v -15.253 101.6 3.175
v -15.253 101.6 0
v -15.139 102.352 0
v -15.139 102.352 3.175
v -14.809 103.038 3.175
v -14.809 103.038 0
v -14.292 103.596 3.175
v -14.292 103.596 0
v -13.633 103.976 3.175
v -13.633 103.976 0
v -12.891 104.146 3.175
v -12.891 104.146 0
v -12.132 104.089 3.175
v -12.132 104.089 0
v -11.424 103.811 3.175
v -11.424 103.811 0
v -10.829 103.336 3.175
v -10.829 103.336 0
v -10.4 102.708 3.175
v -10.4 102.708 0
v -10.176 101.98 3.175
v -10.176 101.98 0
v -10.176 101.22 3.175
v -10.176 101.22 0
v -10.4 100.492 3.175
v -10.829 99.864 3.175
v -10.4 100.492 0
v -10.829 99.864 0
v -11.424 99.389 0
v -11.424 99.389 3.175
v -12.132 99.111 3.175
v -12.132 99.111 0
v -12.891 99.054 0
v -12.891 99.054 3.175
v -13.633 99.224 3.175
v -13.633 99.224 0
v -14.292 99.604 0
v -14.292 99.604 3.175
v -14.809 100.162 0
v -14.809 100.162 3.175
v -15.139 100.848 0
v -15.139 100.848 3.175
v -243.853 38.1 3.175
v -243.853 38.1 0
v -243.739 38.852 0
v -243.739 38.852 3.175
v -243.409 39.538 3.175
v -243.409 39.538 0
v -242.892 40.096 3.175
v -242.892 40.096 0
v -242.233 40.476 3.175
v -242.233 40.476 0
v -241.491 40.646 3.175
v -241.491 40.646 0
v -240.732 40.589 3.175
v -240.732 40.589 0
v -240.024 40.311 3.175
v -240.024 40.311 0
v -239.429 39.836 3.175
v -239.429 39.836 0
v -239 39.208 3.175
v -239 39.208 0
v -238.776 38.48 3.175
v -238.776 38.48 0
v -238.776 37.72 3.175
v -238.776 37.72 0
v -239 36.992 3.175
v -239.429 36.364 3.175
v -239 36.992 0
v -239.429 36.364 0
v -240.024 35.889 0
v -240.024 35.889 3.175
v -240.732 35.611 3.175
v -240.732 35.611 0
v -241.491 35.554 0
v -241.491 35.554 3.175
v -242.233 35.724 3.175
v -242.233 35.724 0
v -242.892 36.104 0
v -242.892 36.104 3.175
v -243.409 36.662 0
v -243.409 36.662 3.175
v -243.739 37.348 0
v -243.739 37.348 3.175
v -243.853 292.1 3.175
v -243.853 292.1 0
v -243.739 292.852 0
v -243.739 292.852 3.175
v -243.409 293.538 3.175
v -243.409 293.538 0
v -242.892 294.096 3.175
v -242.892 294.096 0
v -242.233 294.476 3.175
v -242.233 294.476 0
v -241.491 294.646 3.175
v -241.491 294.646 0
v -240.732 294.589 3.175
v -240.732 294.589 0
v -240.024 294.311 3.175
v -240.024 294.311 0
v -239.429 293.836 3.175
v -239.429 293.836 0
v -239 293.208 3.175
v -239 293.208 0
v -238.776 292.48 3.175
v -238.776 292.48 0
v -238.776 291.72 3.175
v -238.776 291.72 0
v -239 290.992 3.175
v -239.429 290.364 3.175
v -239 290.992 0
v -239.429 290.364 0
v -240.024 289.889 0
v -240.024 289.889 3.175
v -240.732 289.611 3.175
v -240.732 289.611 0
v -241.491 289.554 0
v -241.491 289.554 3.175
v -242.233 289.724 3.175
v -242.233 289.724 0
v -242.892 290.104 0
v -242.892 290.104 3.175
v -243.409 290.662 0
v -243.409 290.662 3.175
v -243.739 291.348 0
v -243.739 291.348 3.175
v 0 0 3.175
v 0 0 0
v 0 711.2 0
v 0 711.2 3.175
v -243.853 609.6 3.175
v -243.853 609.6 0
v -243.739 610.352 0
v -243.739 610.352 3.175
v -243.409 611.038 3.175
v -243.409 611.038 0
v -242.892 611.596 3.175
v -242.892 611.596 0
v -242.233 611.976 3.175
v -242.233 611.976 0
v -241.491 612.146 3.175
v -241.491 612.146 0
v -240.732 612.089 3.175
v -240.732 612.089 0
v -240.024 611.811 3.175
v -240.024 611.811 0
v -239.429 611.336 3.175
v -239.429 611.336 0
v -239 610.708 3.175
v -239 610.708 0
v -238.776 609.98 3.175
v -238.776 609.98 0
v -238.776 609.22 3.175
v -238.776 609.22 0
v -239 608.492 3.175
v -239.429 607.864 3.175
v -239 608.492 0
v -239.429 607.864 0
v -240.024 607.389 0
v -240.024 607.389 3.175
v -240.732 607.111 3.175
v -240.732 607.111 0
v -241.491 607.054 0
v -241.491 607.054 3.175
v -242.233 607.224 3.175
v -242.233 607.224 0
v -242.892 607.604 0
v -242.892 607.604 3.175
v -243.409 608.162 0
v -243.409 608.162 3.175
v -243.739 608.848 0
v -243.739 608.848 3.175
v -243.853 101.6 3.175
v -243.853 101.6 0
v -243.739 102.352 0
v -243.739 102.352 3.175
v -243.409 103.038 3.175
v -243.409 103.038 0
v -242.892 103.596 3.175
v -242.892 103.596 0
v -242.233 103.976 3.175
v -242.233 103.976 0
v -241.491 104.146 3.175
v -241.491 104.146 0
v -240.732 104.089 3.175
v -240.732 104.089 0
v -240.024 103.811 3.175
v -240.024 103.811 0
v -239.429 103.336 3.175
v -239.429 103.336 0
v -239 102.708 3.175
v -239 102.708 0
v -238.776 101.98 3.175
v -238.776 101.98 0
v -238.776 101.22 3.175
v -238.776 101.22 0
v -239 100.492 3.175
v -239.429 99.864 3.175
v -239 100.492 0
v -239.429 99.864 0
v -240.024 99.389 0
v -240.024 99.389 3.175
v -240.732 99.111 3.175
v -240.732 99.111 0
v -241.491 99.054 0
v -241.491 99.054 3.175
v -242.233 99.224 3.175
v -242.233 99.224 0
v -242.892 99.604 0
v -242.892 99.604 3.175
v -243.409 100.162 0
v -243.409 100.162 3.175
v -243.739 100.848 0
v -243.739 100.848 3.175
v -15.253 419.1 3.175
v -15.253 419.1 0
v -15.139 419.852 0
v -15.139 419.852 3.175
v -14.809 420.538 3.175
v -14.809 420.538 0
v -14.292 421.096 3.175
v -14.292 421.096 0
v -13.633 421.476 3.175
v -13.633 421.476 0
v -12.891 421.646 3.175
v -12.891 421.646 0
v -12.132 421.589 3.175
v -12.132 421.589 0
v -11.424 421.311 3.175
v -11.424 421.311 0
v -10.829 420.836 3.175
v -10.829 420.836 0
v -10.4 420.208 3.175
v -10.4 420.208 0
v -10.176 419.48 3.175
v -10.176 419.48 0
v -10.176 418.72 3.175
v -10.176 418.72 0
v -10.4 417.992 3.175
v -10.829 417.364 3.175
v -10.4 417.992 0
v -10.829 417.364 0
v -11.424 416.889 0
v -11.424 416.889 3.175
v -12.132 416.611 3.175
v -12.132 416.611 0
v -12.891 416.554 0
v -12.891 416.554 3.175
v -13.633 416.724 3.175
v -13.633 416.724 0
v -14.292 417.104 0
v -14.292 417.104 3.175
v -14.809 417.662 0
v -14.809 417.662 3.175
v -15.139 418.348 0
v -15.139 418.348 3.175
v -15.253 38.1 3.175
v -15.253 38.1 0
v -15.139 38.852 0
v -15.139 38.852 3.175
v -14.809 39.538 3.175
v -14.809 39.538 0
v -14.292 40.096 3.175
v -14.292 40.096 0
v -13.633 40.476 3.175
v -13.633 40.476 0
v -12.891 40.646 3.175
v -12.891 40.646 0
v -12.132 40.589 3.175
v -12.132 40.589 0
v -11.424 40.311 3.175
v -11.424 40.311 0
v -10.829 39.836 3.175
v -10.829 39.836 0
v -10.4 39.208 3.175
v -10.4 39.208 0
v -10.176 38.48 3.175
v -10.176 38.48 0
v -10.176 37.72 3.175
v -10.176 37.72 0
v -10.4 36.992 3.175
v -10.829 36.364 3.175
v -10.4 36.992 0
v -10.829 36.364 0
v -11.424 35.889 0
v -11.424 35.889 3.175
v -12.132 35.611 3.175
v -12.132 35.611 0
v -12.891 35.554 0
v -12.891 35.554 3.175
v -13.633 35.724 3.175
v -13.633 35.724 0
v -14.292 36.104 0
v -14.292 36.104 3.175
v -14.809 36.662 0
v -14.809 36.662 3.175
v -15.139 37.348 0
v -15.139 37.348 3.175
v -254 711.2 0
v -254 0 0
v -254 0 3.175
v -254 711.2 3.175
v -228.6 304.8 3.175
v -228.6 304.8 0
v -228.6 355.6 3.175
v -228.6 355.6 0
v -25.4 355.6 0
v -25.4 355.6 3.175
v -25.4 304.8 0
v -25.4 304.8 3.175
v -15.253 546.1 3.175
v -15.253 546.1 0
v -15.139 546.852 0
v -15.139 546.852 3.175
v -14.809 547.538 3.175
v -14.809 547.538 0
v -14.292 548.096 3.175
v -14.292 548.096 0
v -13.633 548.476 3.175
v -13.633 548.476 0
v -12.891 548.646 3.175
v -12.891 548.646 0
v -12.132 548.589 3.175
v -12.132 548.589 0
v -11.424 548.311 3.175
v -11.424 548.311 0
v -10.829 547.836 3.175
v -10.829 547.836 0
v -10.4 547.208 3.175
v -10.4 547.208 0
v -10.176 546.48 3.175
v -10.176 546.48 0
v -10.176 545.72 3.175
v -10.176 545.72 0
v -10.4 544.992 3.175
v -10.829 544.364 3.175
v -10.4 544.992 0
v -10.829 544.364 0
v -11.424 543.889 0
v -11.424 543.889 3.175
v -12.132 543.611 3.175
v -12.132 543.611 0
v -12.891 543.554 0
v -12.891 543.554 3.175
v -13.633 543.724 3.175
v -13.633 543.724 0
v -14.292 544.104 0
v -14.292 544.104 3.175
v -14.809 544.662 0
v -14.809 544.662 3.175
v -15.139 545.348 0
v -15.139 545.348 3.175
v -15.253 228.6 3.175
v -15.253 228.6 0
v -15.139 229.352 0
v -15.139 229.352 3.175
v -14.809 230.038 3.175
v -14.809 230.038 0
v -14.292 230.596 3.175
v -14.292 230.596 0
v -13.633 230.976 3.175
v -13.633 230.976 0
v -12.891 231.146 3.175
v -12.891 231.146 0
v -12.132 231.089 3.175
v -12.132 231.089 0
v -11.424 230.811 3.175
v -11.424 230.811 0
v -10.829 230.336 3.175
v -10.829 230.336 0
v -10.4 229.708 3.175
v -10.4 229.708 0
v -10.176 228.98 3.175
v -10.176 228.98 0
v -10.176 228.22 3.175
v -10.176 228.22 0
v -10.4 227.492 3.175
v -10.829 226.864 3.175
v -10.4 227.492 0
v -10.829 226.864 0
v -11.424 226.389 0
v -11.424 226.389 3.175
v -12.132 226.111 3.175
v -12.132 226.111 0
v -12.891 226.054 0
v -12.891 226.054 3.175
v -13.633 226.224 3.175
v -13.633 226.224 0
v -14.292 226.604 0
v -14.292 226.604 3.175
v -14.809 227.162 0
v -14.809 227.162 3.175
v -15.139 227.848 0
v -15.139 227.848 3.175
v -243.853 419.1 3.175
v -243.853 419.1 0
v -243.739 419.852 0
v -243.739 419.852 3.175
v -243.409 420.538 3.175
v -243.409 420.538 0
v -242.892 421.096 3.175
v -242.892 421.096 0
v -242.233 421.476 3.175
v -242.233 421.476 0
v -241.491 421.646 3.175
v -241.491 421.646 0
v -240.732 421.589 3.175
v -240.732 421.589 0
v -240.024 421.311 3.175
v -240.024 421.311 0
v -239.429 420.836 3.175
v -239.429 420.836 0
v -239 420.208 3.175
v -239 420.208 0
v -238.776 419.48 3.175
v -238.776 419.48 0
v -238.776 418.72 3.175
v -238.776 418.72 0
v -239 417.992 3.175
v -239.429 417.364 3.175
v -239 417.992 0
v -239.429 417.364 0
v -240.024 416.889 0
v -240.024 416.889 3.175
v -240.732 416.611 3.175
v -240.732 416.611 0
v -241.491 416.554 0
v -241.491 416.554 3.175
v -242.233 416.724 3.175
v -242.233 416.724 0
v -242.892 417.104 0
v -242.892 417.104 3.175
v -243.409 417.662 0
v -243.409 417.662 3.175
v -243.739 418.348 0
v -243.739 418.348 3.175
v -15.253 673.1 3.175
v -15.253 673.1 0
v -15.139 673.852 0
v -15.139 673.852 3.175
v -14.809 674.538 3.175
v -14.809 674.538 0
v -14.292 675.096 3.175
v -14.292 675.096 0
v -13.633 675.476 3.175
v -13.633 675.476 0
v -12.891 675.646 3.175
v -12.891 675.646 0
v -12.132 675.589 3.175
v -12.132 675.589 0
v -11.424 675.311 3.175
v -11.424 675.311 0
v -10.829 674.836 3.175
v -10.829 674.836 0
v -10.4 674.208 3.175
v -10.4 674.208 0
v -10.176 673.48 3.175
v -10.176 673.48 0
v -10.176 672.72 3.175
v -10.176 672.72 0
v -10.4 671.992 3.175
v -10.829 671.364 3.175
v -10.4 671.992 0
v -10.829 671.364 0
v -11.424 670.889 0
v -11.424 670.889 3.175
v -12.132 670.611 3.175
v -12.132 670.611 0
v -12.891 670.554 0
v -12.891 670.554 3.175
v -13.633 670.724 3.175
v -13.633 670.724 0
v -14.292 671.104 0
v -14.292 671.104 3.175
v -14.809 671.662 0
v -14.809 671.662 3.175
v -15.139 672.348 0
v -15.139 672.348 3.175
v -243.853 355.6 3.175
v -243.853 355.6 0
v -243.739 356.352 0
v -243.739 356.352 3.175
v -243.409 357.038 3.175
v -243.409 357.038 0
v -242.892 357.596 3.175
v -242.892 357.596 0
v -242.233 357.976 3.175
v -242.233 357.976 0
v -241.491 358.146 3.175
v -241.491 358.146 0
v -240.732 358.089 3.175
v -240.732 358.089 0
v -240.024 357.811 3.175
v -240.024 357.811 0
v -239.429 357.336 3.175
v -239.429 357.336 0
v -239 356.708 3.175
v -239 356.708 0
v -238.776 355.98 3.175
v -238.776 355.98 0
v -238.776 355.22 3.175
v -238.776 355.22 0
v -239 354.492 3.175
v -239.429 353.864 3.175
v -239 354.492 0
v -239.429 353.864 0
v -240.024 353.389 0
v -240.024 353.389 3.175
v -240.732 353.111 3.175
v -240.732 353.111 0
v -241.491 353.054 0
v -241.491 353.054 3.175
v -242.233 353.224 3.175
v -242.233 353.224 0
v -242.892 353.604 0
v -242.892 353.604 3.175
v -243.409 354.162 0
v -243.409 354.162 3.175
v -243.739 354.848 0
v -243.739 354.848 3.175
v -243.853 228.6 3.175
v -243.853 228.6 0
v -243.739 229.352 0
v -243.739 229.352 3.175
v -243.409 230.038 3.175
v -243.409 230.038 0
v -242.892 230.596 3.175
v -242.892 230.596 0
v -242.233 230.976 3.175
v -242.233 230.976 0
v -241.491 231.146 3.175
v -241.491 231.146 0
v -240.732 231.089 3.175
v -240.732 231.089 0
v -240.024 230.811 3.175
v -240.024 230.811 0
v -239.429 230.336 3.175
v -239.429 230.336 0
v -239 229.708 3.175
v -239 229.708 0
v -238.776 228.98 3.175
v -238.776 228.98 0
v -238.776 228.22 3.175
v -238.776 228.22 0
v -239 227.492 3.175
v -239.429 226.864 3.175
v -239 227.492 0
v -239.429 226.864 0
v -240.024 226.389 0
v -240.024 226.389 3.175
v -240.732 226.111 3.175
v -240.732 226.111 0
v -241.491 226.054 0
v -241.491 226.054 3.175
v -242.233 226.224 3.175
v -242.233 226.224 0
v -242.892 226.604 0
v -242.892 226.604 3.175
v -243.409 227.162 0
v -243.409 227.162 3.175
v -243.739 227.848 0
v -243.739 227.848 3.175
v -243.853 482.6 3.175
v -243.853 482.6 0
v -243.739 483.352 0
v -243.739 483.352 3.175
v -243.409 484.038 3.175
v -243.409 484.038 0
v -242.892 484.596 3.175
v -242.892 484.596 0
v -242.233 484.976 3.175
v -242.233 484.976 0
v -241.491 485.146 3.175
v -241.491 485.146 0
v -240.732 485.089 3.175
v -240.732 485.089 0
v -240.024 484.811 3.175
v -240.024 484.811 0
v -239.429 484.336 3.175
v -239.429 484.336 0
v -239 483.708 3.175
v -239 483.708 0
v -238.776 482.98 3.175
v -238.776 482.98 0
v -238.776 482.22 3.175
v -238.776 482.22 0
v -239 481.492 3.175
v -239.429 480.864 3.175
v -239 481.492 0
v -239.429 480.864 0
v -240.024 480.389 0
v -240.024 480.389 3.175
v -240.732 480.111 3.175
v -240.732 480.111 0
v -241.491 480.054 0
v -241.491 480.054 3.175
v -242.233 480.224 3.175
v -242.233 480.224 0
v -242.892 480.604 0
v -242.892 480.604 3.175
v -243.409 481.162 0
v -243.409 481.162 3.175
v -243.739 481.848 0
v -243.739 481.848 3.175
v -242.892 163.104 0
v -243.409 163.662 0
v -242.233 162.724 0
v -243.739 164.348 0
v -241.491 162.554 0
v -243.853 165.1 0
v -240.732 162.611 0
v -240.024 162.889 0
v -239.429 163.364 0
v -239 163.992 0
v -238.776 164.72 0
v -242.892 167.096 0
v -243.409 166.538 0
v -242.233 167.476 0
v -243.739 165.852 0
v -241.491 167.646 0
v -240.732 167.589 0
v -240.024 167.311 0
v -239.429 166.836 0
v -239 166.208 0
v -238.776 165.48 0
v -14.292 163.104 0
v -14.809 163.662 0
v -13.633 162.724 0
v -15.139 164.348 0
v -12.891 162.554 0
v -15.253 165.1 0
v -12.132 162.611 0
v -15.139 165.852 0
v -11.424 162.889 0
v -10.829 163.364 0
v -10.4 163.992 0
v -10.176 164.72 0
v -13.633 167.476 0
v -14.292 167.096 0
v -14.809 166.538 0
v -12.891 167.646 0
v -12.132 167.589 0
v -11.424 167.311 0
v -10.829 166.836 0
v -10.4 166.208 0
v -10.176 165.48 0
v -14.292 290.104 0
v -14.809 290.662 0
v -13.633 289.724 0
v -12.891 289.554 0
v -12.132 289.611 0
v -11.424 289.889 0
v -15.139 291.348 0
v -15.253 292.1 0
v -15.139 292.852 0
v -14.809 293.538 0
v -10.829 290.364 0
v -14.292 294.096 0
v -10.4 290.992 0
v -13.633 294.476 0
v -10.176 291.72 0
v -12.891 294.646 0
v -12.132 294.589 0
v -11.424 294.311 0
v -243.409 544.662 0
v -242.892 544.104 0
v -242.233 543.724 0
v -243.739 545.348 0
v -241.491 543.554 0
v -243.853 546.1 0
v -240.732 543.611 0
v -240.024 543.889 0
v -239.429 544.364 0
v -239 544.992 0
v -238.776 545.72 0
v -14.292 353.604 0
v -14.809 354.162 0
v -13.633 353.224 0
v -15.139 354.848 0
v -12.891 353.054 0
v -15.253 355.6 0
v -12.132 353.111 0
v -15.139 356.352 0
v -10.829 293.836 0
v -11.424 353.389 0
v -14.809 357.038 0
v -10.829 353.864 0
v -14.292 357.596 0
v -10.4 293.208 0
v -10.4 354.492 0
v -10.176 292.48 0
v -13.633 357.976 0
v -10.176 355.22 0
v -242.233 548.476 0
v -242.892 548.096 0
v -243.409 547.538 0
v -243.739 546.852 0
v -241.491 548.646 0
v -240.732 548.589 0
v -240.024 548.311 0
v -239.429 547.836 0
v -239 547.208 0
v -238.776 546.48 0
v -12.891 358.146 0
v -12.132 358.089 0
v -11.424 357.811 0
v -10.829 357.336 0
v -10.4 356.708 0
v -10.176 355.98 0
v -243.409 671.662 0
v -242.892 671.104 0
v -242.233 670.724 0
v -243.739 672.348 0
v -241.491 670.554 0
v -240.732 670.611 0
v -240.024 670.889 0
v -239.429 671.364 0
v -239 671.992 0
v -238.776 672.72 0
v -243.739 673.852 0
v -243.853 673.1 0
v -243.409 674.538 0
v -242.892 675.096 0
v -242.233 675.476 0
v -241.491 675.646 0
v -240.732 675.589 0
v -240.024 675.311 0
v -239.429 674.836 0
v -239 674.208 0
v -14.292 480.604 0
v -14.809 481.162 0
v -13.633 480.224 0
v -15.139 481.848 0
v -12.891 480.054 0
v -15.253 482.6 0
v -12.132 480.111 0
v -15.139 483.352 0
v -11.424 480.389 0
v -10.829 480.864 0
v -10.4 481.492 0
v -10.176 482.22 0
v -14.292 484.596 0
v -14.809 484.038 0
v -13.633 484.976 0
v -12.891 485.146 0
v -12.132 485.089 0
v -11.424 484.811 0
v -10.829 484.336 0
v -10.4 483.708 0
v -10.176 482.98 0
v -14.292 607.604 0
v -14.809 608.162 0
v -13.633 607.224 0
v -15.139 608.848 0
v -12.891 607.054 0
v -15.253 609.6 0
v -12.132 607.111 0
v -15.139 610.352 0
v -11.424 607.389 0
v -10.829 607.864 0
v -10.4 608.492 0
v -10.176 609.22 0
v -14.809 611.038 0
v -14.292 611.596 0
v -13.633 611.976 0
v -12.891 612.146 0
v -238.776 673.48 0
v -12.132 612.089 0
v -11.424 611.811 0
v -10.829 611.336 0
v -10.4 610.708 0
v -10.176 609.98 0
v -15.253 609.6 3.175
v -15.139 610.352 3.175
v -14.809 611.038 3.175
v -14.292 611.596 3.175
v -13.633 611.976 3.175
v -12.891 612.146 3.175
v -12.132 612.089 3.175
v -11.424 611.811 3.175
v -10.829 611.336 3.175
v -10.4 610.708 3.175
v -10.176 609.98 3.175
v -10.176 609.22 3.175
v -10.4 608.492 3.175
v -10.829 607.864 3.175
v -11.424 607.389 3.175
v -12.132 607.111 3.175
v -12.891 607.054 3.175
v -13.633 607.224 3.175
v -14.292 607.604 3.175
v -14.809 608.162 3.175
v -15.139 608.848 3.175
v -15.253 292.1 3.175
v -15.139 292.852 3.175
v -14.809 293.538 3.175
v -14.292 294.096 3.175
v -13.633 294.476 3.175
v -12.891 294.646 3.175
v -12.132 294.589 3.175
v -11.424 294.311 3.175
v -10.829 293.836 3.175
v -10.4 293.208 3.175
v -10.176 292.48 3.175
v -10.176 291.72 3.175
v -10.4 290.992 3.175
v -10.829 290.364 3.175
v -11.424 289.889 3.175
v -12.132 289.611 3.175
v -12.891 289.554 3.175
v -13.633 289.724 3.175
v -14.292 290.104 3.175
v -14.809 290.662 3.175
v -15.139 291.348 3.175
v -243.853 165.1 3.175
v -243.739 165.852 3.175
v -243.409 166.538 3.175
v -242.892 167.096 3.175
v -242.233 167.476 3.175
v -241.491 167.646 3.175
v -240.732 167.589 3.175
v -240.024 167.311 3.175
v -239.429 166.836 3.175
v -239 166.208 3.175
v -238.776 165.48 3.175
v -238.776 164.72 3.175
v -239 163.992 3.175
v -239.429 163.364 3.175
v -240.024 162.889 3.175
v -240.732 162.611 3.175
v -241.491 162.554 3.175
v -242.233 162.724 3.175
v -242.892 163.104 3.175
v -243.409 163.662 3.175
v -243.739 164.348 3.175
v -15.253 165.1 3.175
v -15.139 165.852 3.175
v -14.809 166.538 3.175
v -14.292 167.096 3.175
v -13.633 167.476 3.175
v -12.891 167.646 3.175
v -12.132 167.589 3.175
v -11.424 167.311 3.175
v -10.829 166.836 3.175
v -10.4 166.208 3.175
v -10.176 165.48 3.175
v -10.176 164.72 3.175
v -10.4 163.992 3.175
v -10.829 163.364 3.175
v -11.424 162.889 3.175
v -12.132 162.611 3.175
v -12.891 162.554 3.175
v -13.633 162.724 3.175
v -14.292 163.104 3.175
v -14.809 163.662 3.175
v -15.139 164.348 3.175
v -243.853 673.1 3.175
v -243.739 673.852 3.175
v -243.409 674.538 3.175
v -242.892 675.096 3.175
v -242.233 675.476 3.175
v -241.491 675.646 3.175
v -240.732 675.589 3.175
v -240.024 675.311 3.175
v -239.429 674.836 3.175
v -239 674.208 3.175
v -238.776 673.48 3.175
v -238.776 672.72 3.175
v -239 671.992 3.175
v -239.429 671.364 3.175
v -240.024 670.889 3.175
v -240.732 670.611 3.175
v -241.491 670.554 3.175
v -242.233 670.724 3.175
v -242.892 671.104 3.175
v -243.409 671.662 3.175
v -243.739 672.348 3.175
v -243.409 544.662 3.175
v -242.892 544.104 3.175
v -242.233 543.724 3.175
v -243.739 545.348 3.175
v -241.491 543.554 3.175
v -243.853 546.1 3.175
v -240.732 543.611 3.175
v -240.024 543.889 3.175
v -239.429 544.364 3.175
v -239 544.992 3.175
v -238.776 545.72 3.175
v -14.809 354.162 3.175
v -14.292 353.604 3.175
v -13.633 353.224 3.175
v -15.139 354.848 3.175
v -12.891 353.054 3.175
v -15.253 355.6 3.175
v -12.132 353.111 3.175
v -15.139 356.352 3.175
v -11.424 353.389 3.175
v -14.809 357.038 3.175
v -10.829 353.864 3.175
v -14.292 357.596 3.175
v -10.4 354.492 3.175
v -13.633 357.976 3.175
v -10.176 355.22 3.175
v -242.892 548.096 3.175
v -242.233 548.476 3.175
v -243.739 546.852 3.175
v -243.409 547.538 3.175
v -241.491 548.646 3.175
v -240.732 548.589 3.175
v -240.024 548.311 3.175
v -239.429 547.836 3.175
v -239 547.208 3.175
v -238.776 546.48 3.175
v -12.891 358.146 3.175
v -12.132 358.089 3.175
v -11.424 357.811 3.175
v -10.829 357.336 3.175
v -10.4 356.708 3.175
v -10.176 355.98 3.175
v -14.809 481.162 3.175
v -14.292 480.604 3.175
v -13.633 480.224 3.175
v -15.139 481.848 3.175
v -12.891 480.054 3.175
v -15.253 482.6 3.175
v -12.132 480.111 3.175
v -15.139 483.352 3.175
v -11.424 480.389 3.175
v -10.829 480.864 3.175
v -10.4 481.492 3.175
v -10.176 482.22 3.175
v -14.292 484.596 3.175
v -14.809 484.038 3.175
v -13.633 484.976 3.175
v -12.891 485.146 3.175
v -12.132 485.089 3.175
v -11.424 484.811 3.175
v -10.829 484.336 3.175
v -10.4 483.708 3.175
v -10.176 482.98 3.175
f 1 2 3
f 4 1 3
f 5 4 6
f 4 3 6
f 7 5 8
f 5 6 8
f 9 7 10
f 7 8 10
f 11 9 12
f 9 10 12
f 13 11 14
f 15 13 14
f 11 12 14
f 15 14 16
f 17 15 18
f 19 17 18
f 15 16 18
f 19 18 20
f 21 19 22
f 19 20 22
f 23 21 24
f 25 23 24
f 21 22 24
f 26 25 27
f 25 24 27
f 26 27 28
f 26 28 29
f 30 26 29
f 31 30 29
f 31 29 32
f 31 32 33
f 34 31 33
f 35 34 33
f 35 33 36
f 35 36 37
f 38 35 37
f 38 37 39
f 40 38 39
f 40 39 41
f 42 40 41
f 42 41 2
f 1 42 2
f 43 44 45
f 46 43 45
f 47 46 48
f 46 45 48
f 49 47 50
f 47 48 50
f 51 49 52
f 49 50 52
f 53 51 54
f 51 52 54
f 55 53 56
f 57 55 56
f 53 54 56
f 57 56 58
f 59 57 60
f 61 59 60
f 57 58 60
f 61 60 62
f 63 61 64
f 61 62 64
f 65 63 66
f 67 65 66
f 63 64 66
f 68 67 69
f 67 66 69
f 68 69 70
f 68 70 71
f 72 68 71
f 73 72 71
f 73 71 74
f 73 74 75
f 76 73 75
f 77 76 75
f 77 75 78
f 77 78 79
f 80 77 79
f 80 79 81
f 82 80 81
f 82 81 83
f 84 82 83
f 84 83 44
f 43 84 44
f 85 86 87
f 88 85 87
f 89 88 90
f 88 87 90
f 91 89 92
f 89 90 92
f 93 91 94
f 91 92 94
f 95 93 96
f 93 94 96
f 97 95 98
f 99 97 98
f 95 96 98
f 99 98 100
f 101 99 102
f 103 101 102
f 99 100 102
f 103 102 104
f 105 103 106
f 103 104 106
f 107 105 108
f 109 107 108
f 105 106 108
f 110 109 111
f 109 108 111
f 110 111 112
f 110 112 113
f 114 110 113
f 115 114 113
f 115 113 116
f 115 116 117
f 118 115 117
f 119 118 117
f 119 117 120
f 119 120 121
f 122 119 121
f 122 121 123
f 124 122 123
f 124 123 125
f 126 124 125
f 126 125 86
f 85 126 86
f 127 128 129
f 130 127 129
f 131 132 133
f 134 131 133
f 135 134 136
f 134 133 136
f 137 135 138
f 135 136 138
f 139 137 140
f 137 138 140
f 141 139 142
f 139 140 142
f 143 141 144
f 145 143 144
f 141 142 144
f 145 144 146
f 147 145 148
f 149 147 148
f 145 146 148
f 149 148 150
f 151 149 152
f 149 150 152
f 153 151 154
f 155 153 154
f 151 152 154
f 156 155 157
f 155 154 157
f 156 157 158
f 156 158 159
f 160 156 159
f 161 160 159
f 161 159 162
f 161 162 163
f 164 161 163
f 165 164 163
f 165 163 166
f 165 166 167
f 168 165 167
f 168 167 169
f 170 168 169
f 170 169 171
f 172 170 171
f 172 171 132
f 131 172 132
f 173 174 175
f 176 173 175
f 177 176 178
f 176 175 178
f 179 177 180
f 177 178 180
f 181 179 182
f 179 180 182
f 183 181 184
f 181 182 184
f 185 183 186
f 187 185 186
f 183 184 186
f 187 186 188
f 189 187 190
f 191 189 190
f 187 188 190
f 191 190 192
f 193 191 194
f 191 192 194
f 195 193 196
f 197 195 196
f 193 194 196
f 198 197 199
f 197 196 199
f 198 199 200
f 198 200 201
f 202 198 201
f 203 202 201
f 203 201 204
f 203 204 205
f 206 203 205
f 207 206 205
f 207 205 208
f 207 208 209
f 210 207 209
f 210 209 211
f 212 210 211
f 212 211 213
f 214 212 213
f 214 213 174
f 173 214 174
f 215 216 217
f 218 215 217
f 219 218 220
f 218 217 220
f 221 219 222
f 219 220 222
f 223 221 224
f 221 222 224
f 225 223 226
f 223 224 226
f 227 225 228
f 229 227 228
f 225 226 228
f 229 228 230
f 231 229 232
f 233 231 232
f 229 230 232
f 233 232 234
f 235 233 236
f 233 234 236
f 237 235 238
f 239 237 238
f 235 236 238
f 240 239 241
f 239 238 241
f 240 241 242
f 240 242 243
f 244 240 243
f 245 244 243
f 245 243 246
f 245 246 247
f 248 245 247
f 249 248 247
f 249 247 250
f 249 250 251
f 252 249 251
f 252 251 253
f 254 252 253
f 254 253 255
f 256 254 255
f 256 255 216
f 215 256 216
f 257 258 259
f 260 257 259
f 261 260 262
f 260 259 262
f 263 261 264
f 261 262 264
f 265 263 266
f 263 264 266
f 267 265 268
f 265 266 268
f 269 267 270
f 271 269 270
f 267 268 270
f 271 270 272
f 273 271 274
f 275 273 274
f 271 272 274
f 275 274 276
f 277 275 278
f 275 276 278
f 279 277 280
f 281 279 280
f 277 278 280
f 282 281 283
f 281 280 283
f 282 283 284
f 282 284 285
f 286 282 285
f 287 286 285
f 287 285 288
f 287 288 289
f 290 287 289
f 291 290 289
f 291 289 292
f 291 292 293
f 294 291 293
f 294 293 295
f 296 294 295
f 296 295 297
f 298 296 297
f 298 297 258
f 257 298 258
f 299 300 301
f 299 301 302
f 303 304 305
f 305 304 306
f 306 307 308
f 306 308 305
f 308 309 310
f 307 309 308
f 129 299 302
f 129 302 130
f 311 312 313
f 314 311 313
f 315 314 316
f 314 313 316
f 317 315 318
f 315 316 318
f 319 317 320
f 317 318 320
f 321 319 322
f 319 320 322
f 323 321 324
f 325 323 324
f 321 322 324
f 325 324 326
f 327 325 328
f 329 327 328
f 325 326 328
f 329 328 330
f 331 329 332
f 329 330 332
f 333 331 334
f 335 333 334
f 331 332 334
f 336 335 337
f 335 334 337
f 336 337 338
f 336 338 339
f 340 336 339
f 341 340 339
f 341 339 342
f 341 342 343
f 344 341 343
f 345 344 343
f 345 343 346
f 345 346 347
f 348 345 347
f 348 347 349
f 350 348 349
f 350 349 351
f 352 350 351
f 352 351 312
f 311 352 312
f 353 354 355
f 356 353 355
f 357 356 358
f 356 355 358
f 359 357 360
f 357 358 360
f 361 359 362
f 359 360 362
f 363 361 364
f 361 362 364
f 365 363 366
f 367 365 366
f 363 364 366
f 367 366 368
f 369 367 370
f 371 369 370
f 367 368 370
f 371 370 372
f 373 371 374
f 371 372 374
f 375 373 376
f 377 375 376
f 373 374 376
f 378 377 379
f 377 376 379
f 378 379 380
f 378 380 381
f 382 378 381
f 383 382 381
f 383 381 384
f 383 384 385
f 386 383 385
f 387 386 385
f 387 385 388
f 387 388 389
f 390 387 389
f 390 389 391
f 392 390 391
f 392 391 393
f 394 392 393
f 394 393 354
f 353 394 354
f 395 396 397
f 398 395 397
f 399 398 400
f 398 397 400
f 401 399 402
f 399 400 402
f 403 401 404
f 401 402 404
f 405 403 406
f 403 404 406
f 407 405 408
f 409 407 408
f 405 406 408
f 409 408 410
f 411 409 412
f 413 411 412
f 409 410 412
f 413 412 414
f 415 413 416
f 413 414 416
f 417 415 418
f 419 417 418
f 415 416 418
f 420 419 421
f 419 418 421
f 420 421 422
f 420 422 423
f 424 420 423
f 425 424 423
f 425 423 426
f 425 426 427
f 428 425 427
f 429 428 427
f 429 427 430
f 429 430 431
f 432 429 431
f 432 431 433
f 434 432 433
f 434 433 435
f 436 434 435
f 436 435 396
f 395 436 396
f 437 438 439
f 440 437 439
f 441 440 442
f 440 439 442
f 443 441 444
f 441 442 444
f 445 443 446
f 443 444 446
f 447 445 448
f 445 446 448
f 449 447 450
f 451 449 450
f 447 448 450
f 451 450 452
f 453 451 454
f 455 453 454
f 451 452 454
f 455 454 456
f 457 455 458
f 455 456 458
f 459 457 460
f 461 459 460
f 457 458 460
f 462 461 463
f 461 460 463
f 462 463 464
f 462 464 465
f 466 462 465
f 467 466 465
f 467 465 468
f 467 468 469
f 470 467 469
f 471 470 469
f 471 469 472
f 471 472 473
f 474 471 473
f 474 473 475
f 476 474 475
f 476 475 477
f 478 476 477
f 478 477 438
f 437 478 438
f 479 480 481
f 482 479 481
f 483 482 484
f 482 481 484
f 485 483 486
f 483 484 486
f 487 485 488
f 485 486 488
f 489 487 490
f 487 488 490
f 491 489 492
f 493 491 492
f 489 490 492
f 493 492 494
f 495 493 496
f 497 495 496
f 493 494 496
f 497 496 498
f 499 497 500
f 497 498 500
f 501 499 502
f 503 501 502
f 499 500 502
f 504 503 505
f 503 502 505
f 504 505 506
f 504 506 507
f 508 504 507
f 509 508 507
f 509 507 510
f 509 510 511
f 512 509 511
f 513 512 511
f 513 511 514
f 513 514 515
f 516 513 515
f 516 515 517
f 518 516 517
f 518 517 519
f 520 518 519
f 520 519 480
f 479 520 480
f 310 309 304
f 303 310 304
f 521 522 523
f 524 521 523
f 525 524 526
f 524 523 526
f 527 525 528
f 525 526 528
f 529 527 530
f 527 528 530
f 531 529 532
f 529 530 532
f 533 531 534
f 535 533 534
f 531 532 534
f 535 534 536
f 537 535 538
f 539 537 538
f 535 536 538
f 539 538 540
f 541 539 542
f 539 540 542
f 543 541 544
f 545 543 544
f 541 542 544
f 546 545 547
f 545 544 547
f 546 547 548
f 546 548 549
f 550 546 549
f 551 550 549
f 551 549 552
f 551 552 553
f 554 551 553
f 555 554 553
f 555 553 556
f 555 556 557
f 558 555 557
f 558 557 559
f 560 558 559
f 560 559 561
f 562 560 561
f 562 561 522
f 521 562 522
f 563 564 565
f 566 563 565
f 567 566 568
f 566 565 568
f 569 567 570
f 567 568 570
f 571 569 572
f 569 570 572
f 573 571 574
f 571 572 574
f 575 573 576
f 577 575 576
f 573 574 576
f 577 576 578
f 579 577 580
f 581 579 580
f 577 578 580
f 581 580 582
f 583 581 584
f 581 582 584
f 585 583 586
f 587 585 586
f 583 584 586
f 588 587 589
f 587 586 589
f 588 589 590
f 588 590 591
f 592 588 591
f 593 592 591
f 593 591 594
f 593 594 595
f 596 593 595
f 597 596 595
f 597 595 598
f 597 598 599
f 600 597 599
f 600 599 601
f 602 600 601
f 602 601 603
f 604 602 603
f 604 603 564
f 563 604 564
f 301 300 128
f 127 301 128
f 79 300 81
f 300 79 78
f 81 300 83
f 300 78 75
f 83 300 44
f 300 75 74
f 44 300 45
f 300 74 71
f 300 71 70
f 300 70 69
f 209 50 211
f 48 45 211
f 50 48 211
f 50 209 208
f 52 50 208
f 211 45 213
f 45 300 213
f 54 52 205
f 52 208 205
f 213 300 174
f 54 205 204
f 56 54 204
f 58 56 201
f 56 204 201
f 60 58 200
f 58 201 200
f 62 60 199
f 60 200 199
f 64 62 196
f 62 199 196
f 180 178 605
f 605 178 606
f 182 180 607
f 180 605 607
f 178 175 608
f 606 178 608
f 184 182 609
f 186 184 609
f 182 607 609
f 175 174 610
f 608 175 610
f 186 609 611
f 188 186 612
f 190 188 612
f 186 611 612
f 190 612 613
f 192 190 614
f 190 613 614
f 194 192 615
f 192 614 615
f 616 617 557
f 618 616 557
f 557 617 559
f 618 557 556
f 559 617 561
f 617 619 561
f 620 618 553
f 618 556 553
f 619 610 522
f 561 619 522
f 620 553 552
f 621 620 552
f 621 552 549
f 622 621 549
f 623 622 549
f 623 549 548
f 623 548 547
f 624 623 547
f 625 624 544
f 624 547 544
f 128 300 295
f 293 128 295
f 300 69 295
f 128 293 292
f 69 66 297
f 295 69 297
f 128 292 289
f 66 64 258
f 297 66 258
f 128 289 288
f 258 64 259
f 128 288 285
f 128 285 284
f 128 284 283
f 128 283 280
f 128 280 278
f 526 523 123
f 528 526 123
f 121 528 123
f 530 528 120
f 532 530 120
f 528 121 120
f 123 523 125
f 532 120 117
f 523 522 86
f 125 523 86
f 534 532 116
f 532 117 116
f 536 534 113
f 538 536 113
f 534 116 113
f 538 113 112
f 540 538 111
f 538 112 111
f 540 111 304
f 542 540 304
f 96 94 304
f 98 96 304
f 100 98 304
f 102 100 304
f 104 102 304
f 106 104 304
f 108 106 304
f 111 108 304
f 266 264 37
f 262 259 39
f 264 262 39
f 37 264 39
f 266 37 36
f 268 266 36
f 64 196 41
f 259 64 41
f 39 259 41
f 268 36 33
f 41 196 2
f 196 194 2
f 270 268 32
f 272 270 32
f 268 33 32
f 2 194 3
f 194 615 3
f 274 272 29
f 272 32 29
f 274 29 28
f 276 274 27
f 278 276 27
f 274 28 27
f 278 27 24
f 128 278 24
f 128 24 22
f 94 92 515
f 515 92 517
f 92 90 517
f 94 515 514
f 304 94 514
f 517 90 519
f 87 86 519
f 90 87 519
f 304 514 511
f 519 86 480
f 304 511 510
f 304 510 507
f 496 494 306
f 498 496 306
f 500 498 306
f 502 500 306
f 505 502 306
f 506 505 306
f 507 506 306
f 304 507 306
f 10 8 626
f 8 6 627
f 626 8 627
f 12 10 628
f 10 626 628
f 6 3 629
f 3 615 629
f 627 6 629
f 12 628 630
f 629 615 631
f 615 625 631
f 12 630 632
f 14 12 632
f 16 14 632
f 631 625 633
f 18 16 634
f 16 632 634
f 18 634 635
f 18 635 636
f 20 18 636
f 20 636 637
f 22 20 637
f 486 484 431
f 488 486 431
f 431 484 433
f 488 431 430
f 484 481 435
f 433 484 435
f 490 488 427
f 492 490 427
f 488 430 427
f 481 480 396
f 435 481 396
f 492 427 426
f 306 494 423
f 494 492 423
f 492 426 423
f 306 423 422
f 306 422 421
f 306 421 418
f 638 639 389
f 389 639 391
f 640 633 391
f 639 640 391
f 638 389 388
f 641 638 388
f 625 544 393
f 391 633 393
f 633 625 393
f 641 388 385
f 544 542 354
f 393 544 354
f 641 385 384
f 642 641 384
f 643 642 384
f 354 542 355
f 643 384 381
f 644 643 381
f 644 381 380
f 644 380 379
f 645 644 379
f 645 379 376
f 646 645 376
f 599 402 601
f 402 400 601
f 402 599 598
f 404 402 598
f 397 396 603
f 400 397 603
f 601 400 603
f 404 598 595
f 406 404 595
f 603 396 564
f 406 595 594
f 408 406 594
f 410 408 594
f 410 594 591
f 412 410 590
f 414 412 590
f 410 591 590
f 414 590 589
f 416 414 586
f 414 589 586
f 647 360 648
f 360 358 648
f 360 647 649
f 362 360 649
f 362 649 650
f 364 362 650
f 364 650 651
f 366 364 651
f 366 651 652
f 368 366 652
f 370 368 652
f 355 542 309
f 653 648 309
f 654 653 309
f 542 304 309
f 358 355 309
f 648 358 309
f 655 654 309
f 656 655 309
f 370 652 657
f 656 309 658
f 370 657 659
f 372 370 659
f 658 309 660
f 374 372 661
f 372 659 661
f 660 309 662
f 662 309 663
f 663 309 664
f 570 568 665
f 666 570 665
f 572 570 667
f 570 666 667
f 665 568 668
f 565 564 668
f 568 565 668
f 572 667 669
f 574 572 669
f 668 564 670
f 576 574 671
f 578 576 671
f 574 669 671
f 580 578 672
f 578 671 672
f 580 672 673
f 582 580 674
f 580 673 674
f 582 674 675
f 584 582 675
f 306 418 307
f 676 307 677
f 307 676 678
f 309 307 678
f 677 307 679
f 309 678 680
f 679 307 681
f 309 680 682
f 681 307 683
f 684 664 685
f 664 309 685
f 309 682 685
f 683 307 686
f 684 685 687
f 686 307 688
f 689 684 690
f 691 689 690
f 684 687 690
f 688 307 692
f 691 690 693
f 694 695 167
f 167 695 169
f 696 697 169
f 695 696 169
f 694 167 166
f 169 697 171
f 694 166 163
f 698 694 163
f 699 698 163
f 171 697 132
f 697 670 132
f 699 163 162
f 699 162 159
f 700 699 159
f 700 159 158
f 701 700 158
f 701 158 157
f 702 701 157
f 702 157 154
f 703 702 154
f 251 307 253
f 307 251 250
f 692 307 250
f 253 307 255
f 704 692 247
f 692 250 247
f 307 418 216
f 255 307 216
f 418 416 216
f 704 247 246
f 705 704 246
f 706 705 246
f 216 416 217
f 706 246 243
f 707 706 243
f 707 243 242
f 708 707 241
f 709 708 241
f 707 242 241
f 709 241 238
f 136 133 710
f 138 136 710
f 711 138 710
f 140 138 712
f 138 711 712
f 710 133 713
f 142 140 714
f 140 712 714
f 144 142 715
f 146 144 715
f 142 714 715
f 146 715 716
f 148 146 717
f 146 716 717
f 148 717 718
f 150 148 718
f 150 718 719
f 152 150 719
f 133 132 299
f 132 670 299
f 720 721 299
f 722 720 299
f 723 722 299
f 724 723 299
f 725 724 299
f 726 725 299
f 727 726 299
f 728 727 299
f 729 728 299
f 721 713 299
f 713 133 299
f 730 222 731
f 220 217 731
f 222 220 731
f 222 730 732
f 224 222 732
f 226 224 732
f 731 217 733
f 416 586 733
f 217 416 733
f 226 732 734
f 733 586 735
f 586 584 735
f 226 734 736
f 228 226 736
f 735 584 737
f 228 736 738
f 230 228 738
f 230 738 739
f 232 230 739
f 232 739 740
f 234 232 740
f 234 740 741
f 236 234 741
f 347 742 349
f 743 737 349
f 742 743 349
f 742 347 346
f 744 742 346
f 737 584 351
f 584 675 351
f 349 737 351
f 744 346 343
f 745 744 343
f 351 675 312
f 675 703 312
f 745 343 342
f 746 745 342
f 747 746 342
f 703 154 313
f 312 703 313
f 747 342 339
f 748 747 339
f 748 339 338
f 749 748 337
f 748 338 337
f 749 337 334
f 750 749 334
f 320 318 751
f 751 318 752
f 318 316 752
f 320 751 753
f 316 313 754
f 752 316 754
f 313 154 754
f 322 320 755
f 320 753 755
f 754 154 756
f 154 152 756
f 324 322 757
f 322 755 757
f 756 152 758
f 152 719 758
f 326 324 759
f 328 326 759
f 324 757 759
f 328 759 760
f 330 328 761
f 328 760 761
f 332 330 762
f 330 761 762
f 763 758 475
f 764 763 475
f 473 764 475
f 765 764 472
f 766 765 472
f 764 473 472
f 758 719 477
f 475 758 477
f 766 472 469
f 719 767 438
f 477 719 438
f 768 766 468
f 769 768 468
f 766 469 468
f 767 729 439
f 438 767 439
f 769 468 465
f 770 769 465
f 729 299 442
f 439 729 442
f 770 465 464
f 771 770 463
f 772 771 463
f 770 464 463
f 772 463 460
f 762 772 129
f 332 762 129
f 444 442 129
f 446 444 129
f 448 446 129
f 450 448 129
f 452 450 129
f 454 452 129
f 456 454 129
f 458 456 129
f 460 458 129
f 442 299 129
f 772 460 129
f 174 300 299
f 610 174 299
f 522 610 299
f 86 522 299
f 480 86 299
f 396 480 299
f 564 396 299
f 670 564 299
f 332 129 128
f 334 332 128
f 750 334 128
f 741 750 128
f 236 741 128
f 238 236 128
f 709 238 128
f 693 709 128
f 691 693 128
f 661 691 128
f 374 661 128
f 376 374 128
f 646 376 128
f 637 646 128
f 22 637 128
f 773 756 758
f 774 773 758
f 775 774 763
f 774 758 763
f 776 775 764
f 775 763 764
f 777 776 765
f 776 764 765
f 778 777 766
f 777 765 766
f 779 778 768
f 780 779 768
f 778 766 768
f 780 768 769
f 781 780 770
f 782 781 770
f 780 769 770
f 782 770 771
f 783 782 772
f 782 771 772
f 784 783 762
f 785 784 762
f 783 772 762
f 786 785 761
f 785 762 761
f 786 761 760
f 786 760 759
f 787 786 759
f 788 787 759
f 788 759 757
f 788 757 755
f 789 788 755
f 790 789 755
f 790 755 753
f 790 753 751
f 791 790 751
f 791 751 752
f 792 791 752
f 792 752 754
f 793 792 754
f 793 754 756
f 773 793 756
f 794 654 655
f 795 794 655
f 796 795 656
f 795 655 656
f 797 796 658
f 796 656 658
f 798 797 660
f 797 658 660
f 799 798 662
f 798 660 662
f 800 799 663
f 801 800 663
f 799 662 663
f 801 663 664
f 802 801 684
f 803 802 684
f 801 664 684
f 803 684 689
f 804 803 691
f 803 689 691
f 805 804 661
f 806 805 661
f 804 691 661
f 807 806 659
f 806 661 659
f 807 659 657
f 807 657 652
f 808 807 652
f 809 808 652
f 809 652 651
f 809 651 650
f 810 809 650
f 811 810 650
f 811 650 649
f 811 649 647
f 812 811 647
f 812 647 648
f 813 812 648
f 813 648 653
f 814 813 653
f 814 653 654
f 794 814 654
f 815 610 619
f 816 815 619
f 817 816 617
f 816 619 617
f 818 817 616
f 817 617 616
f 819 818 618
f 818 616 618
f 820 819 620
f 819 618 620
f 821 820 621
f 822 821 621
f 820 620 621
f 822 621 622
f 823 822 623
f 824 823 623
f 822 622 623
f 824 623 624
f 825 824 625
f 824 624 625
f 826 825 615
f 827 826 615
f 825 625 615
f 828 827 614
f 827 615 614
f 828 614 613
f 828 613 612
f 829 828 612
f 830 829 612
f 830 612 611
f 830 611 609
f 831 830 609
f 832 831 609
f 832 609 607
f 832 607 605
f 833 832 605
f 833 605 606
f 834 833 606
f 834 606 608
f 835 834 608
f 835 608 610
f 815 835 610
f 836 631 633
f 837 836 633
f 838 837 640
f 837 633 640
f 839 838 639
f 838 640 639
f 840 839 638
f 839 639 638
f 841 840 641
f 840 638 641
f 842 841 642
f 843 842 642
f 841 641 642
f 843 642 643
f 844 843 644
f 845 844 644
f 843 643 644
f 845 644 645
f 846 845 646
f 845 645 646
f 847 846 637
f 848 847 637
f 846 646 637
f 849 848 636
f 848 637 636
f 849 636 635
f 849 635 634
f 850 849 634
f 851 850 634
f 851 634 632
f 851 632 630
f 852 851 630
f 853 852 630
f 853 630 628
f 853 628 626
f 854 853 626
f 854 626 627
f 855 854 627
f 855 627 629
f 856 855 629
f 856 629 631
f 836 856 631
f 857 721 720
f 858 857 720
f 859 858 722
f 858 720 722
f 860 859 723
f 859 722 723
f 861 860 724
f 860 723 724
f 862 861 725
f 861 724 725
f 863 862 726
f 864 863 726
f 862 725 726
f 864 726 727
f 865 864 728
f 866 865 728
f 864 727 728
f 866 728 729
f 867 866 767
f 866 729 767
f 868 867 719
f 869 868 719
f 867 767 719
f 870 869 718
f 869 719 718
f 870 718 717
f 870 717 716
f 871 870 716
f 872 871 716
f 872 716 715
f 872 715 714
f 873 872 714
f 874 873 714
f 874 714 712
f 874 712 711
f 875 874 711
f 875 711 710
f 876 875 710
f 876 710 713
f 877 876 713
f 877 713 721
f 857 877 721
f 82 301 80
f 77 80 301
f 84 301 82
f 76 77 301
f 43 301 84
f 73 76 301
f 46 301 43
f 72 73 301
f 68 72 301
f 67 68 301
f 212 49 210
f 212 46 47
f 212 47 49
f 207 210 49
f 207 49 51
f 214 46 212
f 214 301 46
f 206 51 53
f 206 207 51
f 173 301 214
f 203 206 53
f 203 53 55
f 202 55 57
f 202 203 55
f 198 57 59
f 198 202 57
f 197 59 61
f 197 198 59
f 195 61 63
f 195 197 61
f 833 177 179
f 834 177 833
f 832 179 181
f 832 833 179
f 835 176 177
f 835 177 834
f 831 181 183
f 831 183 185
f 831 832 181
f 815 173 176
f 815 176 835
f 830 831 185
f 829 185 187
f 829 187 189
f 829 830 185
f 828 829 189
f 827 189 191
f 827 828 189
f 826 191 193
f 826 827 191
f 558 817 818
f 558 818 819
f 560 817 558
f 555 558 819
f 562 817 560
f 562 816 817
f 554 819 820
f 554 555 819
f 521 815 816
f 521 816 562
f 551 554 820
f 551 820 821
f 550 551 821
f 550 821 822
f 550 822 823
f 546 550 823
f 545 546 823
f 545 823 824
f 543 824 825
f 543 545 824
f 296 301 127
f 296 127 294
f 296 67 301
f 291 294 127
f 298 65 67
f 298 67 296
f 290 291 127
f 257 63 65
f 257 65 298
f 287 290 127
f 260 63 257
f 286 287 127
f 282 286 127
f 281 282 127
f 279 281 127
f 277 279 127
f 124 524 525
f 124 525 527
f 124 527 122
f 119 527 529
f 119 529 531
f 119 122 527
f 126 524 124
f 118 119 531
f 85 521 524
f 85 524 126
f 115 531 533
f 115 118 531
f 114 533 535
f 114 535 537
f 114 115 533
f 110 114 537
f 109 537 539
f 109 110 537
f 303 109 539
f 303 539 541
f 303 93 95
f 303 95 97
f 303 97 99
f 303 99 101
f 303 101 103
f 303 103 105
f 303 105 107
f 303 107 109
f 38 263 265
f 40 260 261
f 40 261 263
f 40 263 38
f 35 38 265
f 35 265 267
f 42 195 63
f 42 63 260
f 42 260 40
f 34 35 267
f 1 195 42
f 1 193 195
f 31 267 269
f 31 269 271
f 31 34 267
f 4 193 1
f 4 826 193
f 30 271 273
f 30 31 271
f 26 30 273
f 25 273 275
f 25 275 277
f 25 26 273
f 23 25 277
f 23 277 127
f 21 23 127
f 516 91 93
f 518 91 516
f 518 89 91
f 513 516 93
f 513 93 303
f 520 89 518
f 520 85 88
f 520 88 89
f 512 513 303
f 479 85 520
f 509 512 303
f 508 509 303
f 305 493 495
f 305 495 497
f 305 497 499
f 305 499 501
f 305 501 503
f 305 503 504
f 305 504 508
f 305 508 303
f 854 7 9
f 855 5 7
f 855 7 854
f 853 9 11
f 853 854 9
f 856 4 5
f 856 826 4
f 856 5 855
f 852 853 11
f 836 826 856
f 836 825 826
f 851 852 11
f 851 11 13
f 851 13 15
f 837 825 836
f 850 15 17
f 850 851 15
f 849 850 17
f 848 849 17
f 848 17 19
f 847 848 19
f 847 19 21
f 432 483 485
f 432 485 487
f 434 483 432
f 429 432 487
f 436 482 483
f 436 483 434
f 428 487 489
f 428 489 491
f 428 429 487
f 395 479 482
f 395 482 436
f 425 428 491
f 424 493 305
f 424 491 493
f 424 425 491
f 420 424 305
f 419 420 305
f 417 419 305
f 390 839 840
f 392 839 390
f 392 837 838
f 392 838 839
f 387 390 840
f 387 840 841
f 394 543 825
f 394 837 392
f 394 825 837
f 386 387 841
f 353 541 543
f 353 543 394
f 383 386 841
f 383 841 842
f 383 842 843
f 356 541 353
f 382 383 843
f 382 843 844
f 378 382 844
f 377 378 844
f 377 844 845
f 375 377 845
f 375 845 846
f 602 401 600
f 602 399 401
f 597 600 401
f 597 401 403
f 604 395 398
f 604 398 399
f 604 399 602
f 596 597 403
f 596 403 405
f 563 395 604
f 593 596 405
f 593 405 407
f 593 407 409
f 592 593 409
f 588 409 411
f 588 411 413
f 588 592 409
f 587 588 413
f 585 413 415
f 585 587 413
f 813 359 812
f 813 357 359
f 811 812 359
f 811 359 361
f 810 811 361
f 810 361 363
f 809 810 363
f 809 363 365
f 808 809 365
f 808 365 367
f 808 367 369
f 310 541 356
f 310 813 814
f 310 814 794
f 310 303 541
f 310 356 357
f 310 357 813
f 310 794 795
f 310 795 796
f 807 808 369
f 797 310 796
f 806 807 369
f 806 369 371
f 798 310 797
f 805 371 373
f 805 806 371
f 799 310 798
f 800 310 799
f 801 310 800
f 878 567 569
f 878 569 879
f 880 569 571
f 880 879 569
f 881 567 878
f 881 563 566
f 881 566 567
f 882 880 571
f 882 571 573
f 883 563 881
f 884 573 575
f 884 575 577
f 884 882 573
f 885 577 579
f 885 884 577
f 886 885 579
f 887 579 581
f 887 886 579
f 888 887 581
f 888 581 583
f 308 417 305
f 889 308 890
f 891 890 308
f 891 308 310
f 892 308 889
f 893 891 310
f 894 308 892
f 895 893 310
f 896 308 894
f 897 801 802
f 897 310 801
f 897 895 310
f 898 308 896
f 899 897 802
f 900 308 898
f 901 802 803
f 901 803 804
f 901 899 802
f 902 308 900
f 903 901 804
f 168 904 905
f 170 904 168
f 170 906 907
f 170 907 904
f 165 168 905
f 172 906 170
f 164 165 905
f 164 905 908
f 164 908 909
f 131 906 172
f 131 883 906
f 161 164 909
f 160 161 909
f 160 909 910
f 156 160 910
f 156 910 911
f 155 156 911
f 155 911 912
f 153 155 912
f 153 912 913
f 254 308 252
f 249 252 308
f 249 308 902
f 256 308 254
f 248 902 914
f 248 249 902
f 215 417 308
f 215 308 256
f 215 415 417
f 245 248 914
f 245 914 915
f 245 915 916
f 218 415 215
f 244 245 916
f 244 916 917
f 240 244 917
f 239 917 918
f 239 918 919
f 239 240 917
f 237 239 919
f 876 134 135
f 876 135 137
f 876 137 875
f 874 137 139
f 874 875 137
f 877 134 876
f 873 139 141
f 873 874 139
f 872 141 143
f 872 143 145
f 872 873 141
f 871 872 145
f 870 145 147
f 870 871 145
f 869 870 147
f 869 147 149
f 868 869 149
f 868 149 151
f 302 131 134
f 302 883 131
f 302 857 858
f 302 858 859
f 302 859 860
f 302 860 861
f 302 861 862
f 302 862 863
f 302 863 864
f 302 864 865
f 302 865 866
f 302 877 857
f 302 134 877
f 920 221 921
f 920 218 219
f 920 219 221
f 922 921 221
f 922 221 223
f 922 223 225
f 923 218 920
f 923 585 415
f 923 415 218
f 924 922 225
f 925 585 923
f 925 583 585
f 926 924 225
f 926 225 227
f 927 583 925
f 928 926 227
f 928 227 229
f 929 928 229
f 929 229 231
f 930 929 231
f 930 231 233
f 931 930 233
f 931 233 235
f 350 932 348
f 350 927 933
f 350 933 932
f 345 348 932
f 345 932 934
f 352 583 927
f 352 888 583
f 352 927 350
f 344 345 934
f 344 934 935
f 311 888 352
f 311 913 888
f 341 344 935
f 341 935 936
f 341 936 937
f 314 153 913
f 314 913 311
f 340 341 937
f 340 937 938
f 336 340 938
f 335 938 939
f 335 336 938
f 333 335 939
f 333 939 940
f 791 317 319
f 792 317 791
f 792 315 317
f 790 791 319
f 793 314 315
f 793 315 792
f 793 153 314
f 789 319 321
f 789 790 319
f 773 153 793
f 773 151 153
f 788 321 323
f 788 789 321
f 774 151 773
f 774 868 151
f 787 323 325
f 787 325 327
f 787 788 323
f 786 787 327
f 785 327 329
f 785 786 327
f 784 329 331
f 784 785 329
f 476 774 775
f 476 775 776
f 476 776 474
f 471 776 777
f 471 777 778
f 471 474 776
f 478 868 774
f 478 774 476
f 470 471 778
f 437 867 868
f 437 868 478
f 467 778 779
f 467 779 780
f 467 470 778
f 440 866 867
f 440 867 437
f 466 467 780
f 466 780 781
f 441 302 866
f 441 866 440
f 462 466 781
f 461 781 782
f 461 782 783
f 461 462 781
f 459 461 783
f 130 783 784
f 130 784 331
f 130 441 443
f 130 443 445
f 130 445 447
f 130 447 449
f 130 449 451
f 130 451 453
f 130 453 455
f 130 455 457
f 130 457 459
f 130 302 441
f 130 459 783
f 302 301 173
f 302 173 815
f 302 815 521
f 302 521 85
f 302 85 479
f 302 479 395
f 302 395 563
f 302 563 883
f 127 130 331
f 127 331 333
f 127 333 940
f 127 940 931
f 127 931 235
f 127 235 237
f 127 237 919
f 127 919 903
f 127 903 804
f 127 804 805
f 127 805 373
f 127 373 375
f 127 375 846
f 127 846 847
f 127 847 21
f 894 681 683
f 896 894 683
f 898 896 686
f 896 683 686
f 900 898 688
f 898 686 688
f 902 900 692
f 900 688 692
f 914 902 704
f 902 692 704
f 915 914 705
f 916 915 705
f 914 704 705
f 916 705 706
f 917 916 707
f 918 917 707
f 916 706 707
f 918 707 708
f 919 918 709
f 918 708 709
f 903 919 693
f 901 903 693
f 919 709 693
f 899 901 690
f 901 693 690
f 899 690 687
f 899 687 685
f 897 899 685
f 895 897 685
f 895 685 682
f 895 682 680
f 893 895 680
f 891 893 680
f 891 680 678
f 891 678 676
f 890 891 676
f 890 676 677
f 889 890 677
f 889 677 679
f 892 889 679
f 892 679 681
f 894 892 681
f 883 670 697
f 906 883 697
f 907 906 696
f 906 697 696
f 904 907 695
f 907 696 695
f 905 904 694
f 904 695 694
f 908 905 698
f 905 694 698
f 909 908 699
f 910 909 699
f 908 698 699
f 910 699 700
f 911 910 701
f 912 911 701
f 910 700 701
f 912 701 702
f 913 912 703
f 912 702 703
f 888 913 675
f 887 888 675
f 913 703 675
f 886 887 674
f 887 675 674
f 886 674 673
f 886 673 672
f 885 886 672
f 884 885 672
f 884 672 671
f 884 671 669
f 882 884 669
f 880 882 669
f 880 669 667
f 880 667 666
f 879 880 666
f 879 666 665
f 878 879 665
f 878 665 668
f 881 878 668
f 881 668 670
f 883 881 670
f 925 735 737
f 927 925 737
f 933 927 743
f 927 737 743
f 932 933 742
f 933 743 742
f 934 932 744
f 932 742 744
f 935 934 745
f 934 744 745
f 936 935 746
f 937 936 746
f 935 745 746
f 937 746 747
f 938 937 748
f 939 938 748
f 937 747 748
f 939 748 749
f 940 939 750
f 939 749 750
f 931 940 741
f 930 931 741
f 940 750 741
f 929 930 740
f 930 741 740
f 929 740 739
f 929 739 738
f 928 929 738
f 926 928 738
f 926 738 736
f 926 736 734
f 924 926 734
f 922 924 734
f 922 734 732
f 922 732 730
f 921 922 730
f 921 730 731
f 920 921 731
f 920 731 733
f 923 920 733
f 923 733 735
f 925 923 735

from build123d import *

# Parameters (mm, degrees)
SKETCH1_W              = 254
SKETCH1_H              = 711.2
BOSS_EXTRUDE1_DEPTH    = 3.175
F_10_CLEARANCE_HOLE1_D = 5.1054
LPATTERN1_COUNT        = 11
LPATTERN1_PITCH        = 63.5
SKETCH7_W              = 203.2
SKETCH7_H              = 50.8
CUT_EXTRUDE1_DEPTH     = 756.20296651


with BuildPart() as part:
    # Sketch1 → Boss-Extrude1 (new body)
    with BuildSketch(Plane.XY):
        with Locations((-127, 355.6)):
            Rectangle(SKETCH1_W, SKETCH1_H)
    extrude(amount=BOSS_EXTRUDE1_DEPTH)

    # #10 Clearance Hole1 (through all)
    with Locations(Plane.XY.offset(3.175)):
        with Locations((-241.3, 673.1), (-12.7, 673.1)):
            f_10_clearance_hole1 = Hole(F_10_CLEARANCE_HOLE1_D / 2)

    # LPattern1: #10 Clearance Hole1 ×11
    with Locations(*[(0, -i * LPATTERN1_PITCH, 0) for i in range(1, LPATTERN1_COUNT)]):
        add(f_10_clearance_hole1, mode=Mode.SUBTRACT)

    # Sketch7 → Cut-Extrude1 (cut, through all)
    with BuildSketch(Plane(origin=(0, 0, 0), x_dir=(-1, 0, 0), z_dir=(0, 0, -1))):
        with Locations((127, 330.2)):
            Rectangle(SKETCH7_W, SKETCH7_H)
    extrude(amount=-CUT_EXTRUDE1_DEPTH, mode=Mode.SUBTRACT)


solid = part.part
